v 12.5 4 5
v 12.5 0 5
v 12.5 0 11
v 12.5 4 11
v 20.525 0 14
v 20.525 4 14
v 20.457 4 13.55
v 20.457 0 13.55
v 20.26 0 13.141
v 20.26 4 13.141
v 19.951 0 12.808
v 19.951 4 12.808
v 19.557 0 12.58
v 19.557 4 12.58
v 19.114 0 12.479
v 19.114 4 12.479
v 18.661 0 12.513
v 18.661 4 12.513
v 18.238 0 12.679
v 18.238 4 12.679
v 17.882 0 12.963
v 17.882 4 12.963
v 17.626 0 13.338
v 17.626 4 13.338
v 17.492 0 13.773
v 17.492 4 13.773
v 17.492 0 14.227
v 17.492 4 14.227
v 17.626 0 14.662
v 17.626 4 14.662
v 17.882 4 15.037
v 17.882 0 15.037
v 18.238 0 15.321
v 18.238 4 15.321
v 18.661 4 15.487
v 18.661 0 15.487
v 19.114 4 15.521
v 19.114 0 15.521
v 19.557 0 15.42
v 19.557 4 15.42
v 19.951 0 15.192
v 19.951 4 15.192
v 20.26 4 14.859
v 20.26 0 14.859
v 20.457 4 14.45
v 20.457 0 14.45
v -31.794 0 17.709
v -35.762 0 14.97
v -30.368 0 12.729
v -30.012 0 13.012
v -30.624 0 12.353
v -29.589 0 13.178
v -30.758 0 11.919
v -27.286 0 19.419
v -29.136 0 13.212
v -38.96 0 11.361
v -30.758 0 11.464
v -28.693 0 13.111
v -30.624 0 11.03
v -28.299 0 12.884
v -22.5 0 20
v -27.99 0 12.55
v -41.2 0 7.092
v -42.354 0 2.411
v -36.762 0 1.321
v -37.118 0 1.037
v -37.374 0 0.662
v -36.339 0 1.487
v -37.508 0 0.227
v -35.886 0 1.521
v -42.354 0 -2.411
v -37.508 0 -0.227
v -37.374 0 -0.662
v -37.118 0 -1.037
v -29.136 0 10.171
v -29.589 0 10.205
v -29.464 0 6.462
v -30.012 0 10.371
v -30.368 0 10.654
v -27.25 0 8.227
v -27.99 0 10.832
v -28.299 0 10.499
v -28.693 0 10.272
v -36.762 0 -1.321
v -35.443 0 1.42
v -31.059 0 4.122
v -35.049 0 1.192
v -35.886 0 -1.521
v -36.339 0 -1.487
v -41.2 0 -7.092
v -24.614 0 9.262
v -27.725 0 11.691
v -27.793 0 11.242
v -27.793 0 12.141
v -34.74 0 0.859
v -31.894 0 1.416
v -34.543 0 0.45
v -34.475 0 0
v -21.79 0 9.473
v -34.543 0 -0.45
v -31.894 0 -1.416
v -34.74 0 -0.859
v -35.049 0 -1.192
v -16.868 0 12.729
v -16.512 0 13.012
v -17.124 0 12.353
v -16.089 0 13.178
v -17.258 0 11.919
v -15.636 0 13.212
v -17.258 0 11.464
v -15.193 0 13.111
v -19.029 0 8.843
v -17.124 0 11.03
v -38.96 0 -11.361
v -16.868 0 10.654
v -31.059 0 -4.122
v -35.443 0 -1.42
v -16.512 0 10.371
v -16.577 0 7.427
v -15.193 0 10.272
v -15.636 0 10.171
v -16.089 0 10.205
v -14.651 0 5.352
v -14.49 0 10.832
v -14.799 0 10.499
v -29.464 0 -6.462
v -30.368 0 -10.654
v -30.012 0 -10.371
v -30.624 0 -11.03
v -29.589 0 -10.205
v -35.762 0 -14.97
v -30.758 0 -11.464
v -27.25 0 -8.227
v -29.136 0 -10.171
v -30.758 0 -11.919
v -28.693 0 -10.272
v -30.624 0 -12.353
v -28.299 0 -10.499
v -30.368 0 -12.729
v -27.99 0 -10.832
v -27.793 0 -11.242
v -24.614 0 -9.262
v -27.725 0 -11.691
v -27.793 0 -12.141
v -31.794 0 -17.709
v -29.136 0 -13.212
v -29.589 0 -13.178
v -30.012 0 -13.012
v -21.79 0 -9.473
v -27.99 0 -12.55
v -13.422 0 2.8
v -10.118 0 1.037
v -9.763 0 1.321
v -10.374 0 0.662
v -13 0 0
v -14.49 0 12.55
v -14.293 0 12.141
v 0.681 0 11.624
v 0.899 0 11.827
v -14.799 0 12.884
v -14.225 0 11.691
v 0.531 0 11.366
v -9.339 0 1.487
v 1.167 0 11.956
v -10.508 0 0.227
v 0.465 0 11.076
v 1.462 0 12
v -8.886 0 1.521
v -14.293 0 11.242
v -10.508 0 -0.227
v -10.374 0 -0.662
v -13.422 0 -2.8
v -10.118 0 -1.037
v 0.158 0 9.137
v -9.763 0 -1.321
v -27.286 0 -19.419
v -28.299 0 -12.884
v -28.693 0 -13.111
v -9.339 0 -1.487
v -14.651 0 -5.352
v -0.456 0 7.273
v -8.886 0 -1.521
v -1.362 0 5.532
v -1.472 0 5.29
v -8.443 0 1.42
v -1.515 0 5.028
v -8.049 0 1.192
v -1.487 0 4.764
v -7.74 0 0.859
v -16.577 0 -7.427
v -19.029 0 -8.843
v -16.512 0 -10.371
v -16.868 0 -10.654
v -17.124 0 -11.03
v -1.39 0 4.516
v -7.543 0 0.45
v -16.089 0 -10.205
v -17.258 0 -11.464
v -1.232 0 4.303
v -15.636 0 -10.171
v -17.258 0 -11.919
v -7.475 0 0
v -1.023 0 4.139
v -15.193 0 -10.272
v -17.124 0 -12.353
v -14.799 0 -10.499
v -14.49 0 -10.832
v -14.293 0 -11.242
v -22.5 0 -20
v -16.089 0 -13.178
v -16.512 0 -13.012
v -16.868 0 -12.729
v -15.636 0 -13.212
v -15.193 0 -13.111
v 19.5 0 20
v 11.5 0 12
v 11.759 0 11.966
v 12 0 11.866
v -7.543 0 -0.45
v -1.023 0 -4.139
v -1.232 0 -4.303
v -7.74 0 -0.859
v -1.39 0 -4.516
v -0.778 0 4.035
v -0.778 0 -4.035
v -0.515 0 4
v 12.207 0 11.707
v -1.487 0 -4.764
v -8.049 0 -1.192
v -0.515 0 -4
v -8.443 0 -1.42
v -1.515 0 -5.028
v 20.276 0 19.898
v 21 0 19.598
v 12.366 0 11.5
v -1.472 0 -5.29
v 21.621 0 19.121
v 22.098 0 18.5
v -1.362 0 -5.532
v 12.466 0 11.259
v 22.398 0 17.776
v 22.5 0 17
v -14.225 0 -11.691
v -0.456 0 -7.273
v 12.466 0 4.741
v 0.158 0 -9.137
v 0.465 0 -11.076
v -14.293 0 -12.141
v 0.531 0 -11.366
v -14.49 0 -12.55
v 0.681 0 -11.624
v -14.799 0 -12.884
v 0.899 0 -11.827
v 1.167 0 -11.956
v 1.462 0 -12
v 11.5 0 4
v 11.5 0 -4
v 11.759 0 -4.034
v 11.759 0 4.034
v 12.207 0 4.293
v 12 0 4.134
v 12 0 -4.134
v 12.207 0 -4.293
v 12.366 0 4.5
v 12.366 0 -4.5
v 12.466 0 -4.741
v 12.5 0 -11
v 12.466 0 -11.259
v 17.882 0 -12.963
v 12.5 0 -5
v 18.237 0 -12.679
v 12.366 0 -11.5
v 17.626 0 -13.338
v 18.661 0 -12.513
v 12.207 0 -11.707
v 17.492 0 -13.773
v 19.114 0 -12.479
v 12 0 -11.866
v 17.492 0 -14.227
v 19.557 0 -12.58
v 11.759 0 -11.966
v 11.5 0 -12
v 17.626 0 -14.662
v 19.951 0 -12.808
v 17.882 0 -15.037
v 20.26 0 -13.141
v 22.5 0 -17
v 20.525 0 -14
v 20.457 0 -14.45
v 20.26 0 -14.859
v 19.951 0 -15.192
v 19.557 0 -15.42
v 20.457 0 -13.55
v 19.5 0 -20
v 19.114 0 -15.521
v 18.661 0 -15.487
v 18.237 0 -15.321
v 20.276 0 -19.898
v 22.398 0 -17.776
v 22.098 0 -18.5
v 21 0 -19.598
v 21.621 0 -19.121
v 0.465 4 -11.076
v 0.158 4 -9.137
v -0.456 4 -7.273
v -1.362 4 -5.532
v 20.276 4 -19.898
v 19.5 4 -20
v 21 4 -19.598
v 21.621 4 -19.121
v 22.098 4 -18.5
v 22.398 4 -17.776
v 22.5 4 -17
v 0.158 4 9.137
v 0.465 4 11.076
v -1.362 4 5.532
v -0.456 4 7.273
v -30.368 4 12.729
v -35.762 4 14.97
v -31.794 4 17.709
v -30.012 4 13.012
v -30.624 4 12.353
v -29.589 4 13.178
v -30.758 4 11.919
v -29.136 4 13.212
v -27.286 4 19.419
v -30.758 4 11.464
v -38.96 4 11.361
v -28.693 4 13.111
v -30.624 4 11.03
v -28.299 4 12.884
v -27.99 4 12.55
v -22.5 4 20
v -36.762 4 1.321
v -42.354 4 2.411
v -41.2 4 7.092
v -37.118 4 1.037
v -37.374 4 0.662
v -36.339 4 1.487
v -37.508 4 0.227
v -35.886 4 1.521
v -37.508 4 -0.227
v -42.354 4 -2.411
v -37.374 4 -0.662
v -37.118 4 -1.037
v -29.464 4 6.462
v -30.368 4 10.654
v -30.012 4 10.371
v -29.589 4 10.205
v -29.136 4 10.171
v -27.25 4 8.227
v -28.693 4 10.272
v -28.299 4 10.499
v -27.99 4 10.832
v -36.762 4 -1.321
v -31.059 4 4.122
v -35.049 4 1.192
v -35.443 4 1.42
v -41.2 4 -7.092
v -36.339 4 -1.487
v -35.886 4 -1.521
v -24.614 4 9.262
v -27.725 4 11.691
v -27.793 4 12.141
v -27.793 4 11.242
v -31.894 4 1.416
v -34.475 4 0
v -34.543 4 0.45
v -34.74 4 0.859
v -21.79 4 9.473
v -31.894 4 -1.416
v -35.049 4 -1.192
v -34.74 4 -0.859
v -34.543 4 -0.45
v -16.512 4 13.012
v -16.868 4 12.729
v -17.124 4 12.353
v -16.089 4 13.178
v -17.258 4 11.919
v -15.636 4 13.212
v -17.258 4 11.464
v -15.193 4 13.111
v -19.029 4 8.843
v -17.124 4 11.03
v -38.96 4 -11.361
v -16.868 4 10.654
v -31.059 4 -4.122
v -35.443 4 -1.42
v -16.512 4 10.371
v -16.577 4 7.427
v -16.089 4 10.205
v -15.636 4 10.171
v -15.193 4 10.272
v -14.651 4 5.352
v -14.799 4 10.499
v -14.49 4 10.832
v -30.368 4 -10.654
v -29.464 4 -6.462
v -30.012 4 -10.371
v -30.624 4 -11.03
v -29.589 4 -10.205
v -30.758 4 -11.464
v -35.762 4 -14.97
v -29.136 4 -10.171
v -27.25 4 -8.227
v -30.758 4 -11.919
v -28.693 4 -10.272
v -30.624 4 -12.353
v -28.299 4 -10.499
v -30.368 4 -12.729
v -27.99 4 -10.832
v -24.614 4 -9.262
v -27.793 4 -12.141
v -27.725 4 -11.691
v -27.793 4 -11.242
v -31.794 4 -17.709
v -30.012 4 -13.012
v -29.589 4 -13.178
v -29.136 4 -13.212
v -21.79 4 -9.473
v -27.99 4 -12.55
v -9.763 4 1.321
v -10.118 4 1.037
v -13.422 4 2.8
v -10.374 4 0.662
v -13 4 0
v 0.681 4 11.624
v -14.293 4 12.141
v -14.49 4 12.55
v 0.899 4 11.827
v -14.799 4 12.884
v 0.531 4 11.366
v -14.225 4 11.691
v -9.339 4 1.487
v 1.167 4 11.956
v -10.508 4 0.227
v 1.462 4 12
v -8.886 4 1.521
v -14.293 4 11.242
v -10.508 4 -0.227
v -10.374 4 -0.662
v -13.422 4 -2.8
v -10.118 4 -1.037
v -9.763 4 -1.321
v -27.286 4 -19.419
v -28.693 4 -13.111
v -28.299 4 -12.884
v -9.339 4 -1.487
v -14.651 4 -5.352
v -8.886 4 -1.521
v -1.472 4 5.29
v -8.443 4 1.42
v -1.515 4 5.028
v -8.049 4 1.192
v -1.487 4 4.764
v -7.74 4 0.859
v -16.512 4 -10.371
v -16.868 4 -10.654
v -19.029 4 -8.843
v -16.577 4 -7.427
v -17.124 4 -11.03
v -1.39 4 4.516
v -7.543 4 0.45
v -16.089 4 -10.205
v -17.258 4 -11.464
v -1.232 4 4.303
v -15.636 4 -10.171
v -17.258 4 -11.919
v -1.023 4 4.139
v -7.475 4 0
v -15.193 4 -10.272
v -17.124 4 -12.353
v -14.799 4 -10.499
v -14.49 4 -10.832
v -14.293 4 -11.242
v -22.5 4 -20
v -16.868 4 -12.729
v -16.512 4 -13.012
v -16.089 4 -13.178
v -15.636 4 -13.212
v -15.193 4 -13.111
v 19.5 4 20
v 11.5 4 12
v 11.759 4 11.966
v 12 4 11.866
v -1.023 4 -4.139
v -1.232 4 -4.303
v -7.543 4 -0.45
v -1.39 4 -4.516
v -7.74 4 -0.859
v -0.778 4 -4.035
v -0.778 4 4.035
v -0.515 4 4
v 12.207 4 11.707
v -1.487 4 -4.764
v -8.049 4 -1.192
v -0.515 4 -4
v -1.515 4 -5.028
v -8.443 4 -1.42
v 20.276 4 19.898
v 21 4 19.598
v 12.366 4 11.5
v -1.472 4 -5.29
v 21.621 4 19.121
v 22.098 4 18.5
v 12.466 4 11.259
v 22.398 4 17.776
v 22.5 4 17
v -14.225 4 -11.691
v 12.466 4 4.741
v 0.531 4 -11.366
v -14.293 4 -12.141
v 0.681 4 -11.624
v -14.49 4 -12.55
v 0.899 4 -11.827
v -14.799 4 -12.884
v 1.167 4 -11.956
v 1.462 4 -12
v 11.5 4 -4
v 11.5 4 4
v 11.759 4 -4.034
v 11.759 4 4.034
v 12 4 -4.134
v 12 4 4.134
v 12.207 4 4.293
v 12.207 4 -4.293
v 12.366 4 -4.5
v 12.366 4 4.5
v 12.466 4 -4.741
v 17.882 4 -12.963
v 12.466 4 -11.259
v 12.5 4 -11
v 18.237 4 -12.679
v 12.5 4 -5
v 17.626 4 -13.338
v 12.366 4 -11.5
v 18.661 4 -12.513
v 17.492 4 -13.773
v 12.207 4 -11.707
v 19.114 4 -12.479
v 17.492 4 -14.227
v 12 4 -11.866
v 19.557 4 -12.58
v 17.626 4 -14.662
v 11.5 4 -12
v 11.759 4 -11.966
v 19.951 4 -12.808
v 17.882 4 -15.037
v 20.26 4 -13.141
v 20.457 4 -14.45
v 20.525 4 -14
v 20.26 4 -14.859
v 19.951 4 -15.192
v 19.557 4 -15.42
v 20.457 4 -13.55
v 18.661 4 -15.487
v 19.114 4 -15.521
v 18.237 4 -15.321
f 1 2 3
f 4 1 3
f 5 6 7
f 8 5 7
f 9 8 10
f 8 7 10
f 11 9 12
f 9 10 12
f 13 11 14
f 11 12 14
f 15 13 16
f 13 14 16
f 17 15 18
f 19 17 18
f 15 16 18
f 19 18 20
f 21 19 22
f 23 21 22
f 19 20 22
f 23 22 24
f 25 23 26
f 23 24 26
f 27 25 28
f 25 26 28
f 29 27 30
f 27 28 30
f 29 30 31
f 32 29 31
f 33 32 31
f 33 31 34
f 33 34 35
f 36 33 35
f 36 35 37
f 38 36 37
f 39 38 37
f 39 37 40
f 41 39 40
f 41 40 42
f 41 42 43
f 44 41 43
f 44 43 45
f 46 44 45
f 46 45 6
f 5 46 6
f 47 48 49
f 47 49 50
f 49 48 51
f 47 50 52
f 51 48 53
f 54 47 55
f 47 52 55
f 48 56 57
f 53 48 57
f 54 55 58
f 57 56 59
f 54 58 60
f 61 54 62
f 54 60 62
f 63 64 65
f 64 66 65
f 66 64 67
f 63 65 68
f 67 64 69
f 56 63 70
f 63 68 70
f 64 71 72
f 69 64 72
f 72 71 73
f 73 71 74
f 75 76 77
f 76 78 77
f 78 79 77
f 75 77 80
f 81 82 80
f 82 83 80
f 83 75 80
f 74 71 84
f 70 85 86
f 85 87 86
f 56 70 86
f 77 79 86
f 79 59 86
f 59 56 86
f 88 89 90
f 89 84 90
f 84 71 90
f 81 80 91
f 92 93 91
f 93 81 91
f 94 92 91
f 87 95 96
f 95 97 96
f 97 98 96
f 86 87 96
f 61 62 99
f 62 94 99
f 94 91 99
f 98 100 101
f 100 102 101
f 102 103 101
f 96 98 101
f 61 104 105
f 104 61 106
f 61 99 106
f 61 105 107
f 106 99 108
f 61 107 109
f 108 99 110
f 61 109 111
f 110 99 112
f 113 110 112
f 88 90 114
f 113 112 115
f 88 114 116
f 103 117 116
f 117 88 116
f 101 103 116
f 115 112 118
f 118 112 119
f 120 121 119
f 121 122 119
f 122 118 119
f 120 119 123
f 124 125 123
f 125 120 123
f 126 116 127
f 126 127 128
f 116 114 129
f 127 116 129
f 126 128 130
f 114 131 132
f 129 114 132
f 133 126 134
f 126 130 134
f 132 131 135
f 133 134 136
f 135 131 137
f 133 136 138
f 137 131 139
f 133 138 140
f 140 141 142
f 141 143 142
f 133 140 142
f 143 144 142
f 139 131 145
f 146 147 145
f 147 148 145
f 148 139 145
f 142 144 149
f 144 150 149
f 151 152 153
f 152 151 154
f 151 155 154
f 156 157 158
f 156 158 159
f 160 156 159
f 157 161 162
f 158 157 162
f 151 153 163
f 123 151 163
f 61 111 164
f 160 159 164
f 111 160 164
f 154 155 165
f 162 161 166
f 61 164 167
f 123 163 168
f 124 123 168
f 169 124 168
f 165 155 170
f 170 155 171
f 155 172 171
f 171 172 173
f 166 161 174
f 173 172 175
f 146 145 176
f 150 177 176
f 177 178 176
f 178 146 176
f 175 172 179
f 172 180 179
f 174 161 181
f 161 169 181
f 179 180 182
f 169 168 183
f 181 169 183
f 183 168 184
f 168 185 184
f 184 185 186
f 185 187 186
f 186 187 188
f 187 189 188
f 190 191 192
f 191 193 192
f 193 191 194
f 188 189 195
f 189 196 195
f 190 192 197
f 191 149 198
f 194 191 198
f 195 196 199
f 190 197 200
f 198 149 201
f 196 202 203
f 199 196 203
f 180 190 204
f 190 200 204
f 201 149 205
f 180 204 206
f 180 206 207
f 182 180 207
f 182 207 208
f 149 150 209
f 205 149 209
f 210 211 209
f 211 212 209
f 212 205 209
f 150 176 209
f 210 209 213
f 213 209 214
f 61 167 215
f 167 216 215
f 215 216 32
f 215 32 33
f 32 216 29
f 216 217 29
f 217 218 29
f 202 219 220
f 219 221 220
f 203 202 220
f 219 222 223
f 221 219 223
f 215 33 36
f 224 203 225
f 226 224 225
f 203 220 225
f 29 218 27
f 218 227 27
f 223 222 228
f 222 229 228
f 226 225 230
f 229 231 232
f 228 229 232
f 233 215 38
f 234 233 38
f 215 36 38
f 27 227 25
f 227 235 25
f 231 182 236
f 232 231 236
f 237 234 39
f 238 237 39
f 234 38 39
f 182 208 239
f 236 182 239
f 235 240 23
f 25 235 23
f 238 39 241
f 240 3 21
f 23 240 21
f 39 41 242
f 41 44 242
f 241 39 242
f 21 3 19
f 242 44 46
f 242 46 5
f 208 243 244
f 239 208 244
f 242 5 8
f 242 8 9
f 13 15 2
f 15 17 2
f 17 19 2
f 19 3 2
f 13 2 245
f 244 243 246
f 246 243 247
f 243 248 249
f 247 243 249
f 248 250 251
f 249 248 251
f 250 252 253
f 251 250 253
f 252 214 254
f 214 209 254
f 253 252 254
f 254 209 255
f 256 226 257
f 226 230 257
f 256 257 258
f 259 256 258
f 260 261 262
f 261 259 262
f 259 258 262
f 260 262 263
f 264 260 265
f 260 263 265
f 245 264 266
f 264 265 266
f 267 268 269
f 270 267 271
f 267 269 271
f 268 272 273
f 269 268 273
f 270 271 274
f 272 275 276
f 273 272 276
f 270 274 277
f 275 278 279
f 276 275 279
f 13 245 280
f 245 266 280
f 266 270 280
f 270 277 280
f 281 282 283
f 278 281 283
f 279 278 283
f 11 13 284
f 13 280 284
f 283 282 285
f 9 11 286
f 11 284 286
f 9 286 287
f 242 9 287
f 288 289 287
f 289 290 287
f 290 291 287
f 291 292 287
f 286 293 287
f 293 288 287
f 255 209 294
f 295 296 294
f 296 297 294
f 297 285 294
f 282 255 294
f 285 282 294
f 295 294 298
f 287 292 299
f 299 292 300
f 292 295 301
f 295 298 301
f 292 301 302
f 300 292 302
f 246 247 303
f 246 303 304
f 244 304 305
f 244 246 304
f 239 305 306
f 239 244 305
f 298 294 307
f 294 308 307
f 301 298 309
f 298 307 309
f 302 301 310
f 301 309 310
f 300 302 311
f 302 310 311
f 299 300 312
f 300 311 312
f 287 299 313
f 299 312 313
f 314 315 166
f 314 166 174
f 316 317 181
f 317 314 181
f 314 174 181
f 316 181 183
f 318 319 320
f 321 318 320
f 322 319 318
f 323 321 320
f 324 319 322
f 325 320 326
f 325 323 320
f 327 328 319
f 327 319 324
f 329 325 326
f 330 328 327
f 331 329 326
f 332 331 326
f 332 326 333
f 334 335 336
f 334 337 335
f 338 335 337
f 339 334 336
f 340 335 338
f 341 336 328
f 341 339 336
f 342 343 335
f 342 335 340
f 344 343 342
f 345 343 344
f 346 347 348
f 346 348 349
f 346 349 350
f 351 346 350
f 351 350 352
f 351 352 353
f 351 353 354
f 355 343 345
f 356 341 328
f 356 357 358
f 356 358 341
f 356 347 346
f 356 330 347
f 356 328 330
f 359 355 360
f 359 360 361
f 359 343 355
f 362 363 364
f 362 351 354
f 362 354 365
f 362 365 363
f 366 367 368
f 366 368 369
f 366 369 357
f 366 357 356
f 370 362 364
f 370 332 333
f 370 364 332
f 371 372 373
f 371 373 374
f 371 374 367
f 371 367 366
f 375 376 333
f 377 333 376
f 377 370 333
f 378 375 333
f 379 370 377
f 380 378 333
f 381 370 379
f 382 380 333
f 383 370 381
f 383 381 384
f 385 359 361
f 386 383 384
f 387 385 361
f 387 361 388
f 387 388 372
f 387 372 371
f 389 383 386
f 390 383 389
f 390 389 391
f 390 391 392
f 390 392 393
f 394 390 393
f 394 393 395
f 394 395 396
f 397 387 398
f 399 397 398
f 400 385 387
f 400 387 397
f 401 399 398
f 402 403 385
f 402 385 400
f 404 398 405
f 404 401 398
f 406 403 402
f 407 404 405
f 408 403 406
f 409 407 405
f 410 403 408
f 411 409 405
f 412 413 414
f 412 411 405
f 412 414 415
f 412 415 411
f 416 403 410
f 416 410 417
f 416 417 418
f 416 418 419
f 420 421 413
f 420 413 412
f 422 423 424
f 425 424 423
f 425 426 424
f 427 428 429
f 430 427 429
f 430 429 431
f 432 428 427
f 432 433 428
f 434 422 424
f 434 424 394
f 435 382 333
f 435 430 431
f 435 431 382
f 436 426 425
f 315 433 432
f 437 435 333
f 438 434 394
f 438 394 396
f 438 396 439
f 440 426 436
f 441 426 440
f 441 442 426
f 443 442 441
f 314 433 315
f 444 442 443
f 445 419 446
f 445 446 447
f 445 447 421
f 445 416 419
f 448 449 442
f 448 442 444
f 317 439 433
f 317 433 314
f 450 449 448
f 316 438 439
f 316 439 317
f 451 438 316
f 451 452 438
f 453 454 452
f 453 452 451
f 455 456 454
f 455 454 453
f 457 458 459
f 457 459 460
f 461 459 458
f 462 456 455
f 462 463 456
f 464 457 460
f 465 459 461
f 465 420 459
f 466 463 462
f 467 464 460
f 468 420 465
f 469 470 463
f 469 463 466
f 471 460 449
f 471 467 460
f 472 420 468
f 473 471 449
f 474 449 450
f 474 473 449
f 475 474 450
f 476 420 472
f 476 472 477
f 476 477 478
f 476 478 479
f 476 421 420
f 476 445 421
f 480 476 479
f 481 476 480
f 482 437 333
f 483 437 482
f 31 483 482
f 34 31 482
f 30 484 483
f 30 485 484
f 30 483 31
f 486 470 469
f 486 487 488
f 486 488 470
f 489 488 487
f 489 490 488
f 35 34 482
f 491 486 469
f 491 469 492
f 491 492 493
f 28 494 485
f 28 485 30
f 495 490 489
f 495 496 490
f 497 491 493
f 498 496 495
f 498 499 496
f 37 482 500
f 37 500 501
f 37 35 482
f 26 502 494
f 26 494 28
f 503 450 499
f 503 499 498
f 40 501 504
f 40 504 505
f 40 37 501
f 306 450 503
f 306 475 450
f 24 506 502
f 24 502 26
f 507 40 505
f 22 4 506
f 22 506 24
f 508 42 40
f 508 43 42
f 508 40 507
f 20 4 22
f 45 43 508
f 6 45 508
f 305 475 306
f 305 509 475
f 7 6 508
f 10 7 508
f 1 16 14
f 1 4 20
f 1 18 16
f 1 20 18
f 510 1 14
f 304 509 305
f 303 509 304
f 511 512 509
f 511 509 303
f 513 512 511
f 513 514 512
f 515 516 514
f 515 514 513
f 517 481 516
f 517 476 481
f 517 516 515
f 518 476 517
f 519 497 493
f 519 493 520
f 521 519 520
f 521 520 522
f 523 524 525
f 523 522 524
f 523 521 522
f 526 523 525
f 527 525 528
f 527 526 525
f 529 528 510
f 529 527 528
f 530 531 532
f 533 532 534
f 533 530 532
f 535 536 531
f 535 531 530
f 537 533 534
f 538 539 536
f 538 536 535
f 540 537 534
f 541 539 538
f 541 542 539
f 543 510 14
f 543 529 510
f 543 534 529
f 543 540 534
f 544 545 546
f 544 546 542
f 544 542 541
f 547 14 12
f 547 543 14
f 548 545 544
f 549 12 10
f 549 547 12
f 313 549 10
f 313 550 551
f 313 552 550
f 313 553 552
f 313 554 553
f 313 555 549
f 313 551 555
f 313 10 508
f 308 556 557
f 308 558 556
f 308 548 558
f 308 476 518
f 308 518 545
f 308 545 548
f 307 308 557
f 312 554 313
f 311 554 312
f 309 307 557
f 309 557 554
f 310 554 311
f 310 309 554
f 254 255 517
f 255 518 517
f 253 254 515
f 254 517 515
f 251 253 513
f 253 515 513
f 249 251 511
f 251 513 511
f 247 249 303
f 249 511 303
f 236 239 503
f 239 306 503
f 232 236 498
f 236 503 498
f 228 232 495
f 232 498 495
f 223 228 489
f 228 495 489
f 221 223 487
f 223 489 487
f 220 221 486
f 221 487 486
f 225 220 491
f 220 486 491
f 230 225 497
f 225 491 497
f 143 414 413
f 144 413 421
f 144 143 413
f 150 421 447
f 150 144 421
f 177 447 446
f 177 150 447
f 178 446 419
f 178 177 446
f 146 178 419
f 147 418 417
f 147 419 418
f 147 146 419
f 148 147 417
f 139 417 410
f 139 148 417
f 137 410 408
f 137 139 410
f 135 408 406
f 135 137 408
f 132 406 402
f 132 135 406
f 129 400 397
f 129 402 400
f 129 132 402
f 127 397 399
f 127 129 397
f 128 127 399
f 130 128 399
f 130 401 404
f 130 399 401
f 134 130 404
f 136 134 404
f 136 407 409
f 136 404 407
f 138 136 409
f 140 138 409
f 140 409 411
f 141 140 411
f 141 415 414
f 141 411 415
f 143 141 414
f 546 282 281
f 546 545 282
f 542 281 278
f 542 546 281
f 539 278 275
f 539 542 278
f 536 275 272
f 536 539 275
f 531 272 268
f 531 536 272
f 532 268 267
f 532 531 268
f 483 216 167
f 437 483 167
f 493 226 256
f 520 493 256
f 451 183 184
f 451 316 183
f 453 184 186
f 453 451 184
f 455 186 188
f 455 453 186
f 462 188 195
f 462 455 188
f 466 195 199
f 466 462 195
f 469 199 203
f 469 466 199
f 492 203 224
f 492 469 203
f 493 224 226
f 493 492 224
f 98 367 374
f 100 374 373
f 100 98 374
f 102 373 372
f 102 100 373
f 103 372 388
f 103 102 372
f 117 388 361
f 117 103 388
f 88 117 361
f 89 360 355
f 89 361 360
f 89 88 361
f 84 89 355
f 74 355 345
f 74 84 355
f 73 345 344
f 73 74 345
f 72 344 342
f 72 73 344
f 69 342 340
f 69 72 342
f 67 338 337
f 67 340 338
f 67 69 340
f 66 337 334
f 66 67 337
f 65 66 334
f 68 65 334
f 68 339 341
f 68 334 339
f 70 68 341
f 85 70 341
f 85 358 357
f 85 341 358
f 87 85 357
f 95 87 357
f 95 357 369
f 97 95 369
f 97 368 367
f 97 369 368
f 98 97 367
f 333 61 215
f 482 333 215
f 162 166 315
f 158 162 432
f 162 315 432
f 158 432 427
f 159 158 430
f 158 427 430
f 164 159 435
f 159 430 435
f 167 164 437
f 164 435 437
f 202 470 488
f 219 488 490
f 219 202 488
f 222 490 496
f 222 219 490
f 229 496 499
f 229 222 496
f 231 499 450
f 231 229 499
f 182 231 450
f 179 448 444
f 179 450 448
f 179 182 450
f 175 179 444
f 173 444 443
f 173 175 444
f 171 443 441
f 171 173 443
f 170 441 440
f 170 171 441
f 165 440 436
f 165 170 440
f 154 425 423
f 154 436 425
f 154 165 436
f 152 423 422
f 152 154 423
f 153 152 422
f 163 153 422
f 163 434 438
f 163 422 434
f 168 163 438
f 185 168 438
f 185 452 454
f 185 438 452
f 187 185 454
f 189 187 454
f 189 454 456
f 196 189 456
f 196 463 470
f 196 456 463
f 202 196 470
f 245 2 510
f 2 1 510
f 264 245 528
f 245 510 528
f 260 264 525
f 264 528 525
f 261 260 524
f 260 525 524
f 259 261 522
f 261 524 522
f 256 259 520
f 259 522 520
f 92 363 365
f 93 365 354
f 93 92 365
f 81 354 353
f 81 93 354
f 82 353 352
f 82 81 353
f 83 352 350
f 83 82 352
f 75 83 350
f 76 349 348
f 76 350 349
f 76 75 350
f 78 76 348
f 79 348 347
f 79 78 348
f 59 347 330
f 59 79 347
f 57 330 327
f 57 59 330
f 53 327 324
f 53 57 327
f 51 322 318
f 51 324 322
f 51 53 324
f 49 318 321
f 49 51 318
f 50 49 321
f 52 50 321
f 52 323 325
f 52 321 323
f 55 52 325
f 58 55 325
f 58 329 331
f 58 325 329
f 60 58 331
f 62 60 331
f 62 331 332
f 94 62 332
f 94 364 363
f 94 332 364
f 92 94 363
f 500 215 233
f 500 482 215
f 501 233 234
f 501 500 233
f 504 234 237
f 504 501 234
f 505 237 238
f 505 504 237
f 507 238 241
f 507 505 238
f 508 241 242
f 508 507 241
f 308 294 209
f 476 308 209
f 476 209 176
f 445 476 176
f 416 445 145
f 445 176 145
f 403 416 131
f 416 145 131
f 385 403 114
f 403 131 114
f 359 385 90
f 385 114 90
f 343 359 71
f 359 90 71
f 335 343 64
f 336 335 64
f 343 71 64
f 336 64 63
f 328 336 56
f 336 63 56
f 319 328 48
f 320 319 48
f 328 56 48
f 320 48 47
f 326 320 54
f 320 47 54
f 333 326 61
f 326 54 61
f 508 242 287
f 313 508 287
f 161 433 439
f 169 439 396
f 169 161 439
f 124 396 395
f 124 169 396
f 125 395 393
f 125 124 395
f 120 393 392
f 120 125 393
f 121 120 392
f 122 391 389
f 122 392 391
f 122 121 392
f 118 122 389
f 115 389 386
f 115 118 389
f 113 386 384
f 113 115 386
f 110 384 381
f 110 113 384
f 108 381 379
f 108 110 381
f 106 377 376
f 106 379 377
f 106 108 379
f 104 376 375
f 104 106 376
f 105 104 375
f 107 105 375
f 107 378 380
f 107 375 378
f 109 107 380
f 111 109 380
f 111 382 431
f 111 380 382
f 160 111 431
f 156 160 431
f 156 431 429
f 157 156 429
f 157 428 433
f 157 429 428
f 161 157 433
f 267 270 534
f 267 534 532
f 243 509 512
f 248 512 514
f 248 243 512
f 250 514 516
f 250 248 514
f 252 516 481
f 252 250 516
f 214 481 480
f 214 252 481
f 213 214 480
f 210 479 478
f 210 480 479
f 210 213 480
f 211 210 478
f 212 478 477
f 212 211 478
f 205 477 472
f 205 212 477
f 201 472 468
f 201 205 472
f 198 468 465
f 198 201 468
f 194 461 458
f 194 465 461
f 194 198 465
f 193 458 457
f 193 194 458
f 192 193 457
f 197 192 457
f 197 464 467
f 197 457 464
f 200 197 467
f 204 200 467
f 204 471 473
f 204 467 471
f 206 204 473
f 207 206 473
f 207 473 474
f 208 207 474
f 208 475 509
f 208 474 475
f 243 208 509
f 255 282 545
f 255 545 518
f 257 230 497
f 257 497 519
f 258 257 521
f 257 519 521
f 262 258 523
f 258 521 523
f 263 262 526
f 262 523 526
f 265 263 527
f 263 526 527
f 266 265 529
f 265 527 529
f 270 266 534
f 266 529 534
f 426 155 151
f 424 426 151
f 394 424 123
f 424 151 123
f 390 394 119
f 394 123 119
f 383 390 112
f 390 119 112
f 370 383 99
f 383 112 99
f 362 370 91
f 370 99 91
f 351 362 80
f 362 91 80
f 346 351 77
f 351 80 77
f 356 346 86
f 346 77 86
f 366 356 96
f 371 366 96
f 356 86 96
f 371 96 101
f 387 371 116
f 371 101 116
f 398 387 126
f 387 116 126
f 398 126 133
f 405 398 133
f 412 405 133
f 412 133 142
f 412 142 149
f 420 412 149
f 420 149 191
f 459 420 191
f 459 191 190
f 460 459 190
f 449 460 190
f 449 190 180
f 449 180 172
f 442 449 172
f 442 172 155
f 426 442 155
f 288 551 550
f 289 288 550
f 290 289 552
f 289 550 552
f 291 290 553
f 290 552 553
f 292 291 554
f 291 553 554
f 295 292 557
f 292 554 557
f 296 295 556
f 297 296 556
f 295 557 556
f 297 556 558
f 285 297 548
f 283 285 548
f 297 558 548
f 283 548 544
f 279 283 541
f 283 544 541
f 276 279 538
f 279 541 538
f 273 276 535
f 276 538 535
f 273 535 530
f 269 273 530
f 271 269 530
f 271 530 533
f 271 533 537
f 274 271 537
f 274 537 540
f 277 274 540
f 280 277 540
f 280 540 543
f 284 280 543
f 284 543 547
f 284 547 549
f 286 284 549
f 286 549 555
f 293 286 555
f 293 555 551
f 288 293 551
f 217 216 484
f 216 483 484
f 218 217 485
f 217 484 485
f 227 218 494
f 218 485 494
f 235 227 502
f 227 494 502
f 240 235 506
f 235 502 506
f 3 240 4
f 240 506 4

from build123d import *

# Parameters (mm, degrees)
EXTRUDE_1_DEPTH     = 4
SKETCH_3_R          = 1.525
CUT_EXTRUDE_3_DEPTH = 5
SKETCH_6_R          = 9.5
CUT_EXTRUDE_5_DEPTH = 5
FILLET_1_R          = 3
SKETCH_7_R          = 1.525
CUT_EXTRUDE_6_DEPTH = 10
CUT_EXTRUDE_7_DEPTH = 10
FILLET_2_R          = 1


with BuildPart() as part:
    # 草图1 → 凸台-拉伸1 (new body)
    with BuildSketch(Plane(origin=(0, 0, 0), x_dir=(1, 0, 0), z_dir=(0, 1, 0))):
        with BuildLine():
            ThreePointArc((-22.5, 20), (-42.5, 0), (-22.5, -20))
            Line((-22.5, -20), (-22.5, 20))
        make_face()
        with BuildLine():
            Line((-22.5, 20), (-22.5, -20))
            ThreePointArc((-22.5, -20), (-8.357864376, -14.142135624), (-2.5, 0))
            ThreePointArc((-2.5, 0), (-8.357864376, 14.142135624), (-22.5, 20))
        make_face()
        with BuildLine():
            ThreePointArc((-2.5, 0), (-8.357864376, -14.142135624), (-22.5, -20))
            Line((-22.5, -20), (22.5, -20))
            Line((22.5, -20), (22.5, 20))
            Line((22.5, 20), (-22.5, 20))
            ThreePointArc((-22.5, 20), (-8.357864376, 14.142135624), (-2.5, 0))
        make_face()
    extrude(amount=EXTRUDE_1_DEPTH)

    # 草图3 → 切除-拉伸3 (cut, through all)
    with BuildSketch(Plane(origin=(0, 0, 0), x_dir=(1, 0, 0), z_dir=(0, 1, 0))):
        with Locations((-36, 0)):
            Circle(SKETCH_3_R)
        with Locations((-29.25, 11.691342951)):
            Circle(SKETCH_3_R)
        with Locations((-15.75, 11.691342951)):
            Circle(SKETCH_3_R)
        with Locations((-9, 0)):
            Circle(SKETCH_3_R)
        with Locations((-15.75, -11.691342951)):
            Circle(SKETCH_3_R)
        with Locations((-29.25, -11.691342951)):
            Circle(SKETCH_3_R)
    extrude(amount=CUT_EXTRUDE_3_DEPTH, mode=Mode.SUBTRACT)

    # 草图6 → 切除-拉伸5 (cut, through all)
    with BuildSketch(Plane.XZ):
        with Locations((-22.5, 0)):
            Circle(SKETCH_6_R)
    extrude(amount=-CUT_EXTRUDE_5_DEPTH, mode=Mode.SUBTRACT)

    # 圆角1
    fillet_1_edges = [part.edges().sort_by_distance(p)[0] for p in [
        (22.5, 2, -20),
        (22.5, 2, 20),
    ]]
    fillet(fillet_1_edges, radius=FILLET_1_R)

    # 草图7 → 切除-拉伸6 (cut)
    with BuildSketch(Plane(origin=(0, 4, 0), x_dir=(1, 0, 0), z_dir=(0, 1, 0))):
        with Locations((19, -14)):
            Circle(SKETCH_7_R)
        with Locations((18.999999998, 13.999999998)):
            Circle(SKETCH_7_R)
    extrude(amount=-CUT_EXTRUDE_6_DEPTH, mode=Mode.SUBTRACT)

    # 草图8 → 切除-拉伸7 (cut)
    with BuildSketch(Plane.XZ):
        with BuildLine():
            Line((-2.5, 4), (12.5, 4))
            Line((12.5, 4), (12.5, 12))
            Line((12.5, 12), (0.5, 12))
            ThreePointArc((0.5, 12), (-0.274661673, 7.727998127), (-2.5, 4))
        make_face()
        with BuildLine():
            Line((12.5, -12), (0.5, -12))
            ThreePointArc((0.5, -12), (-0.274661673, -7.727998127), (-2.5, -4))
            Line((-2.5, -4), (12.5, -4))
            Line((12.5, -4), (12.5, -12))
        make_face()
    extrude(amount=-CUT_EXTRUDE_7_DEPTH, mode=Mode.SUBTRACT)

    # 圆角2
    fillet_2_edges = [part.edges().sort_by_distance(p)[0] for p in [
        (-2.5, 2, 4),
        (0.5, 2, 12),
        (12.5, 2, 12),
        (12.5, 2, 4),
        (0.5, 2, -12),
        (-2.5, 2, -4),
        (12.5, 2, -4),
        (12.5, 2, -12),
    ]]
    fillet(fillet_2_edges, radius=FILLET_2_R)


solid = part.part
